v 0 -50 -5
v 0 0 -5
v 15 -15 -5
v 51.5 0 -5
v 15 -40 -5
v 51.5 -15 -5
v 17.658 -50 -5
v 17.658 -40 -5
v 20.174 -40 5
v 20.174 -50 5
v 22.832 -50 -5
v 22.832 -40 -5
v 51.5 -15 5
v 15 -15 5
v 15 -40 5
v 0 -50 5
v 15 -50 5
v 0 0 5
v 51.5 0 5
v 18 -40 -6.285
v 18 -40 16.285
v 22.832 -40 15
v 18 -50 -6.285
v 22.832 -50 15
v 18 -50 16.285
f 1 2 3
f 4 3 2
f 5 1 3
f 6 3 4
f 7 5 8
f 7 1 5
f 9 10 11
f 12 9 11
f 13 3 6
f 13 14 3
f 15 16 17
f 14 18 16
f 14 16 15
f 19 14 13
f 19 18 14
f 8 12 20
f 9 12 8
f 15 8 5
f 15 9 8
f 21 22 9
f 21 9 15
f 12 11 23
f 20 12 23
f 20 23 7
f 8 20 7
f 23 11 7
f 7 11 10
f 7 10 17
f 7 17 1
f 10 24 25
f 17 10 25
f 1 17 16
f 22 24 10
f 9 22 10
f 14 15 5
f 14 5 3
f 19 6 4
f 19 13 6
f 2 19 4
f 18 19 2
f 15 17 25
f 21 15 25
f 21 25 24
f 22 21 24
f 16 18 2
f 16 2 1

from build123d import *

# Parameters (mm, degrees)
BOSS_EXTRUDE1_DEPTH = 5
BOSS_EXTRUDE2_DEPTH = 10


with BuildPart() as part:
    # Sketch1 → Boss-Extrude1 (new, symmetric)
    with BuildSketch(Plane.XY):
        Polygon((51.5, 0), (0, 0), (0, -50), (15, -50), (15, -15), (51.5, -15), align=None)
    extrude(amount=BOSS_EXTRUDE1_DEPTH, both=True)

    # Sketch2 → Boss-Extrude2 (add)
    with BuildSketch(Plane.XZ.offset(50)):
        Polygon((22.832157544, -5), (18, -6.284621916), (15, 5), (18, 16.284621916), (22.832157544, 15), (20.173672375, 5), align=None)
        Polygon((15, -5), (17.658485169, -5), (15, 5), align=None)
        Polygon((18, 16.284621916), (15, 5), (20.173672375, 5), (22.832157544, 15), align=None)
    extrude(amount=-BOSS_EXTRUDE2_DEPTH)


solid = part.part
